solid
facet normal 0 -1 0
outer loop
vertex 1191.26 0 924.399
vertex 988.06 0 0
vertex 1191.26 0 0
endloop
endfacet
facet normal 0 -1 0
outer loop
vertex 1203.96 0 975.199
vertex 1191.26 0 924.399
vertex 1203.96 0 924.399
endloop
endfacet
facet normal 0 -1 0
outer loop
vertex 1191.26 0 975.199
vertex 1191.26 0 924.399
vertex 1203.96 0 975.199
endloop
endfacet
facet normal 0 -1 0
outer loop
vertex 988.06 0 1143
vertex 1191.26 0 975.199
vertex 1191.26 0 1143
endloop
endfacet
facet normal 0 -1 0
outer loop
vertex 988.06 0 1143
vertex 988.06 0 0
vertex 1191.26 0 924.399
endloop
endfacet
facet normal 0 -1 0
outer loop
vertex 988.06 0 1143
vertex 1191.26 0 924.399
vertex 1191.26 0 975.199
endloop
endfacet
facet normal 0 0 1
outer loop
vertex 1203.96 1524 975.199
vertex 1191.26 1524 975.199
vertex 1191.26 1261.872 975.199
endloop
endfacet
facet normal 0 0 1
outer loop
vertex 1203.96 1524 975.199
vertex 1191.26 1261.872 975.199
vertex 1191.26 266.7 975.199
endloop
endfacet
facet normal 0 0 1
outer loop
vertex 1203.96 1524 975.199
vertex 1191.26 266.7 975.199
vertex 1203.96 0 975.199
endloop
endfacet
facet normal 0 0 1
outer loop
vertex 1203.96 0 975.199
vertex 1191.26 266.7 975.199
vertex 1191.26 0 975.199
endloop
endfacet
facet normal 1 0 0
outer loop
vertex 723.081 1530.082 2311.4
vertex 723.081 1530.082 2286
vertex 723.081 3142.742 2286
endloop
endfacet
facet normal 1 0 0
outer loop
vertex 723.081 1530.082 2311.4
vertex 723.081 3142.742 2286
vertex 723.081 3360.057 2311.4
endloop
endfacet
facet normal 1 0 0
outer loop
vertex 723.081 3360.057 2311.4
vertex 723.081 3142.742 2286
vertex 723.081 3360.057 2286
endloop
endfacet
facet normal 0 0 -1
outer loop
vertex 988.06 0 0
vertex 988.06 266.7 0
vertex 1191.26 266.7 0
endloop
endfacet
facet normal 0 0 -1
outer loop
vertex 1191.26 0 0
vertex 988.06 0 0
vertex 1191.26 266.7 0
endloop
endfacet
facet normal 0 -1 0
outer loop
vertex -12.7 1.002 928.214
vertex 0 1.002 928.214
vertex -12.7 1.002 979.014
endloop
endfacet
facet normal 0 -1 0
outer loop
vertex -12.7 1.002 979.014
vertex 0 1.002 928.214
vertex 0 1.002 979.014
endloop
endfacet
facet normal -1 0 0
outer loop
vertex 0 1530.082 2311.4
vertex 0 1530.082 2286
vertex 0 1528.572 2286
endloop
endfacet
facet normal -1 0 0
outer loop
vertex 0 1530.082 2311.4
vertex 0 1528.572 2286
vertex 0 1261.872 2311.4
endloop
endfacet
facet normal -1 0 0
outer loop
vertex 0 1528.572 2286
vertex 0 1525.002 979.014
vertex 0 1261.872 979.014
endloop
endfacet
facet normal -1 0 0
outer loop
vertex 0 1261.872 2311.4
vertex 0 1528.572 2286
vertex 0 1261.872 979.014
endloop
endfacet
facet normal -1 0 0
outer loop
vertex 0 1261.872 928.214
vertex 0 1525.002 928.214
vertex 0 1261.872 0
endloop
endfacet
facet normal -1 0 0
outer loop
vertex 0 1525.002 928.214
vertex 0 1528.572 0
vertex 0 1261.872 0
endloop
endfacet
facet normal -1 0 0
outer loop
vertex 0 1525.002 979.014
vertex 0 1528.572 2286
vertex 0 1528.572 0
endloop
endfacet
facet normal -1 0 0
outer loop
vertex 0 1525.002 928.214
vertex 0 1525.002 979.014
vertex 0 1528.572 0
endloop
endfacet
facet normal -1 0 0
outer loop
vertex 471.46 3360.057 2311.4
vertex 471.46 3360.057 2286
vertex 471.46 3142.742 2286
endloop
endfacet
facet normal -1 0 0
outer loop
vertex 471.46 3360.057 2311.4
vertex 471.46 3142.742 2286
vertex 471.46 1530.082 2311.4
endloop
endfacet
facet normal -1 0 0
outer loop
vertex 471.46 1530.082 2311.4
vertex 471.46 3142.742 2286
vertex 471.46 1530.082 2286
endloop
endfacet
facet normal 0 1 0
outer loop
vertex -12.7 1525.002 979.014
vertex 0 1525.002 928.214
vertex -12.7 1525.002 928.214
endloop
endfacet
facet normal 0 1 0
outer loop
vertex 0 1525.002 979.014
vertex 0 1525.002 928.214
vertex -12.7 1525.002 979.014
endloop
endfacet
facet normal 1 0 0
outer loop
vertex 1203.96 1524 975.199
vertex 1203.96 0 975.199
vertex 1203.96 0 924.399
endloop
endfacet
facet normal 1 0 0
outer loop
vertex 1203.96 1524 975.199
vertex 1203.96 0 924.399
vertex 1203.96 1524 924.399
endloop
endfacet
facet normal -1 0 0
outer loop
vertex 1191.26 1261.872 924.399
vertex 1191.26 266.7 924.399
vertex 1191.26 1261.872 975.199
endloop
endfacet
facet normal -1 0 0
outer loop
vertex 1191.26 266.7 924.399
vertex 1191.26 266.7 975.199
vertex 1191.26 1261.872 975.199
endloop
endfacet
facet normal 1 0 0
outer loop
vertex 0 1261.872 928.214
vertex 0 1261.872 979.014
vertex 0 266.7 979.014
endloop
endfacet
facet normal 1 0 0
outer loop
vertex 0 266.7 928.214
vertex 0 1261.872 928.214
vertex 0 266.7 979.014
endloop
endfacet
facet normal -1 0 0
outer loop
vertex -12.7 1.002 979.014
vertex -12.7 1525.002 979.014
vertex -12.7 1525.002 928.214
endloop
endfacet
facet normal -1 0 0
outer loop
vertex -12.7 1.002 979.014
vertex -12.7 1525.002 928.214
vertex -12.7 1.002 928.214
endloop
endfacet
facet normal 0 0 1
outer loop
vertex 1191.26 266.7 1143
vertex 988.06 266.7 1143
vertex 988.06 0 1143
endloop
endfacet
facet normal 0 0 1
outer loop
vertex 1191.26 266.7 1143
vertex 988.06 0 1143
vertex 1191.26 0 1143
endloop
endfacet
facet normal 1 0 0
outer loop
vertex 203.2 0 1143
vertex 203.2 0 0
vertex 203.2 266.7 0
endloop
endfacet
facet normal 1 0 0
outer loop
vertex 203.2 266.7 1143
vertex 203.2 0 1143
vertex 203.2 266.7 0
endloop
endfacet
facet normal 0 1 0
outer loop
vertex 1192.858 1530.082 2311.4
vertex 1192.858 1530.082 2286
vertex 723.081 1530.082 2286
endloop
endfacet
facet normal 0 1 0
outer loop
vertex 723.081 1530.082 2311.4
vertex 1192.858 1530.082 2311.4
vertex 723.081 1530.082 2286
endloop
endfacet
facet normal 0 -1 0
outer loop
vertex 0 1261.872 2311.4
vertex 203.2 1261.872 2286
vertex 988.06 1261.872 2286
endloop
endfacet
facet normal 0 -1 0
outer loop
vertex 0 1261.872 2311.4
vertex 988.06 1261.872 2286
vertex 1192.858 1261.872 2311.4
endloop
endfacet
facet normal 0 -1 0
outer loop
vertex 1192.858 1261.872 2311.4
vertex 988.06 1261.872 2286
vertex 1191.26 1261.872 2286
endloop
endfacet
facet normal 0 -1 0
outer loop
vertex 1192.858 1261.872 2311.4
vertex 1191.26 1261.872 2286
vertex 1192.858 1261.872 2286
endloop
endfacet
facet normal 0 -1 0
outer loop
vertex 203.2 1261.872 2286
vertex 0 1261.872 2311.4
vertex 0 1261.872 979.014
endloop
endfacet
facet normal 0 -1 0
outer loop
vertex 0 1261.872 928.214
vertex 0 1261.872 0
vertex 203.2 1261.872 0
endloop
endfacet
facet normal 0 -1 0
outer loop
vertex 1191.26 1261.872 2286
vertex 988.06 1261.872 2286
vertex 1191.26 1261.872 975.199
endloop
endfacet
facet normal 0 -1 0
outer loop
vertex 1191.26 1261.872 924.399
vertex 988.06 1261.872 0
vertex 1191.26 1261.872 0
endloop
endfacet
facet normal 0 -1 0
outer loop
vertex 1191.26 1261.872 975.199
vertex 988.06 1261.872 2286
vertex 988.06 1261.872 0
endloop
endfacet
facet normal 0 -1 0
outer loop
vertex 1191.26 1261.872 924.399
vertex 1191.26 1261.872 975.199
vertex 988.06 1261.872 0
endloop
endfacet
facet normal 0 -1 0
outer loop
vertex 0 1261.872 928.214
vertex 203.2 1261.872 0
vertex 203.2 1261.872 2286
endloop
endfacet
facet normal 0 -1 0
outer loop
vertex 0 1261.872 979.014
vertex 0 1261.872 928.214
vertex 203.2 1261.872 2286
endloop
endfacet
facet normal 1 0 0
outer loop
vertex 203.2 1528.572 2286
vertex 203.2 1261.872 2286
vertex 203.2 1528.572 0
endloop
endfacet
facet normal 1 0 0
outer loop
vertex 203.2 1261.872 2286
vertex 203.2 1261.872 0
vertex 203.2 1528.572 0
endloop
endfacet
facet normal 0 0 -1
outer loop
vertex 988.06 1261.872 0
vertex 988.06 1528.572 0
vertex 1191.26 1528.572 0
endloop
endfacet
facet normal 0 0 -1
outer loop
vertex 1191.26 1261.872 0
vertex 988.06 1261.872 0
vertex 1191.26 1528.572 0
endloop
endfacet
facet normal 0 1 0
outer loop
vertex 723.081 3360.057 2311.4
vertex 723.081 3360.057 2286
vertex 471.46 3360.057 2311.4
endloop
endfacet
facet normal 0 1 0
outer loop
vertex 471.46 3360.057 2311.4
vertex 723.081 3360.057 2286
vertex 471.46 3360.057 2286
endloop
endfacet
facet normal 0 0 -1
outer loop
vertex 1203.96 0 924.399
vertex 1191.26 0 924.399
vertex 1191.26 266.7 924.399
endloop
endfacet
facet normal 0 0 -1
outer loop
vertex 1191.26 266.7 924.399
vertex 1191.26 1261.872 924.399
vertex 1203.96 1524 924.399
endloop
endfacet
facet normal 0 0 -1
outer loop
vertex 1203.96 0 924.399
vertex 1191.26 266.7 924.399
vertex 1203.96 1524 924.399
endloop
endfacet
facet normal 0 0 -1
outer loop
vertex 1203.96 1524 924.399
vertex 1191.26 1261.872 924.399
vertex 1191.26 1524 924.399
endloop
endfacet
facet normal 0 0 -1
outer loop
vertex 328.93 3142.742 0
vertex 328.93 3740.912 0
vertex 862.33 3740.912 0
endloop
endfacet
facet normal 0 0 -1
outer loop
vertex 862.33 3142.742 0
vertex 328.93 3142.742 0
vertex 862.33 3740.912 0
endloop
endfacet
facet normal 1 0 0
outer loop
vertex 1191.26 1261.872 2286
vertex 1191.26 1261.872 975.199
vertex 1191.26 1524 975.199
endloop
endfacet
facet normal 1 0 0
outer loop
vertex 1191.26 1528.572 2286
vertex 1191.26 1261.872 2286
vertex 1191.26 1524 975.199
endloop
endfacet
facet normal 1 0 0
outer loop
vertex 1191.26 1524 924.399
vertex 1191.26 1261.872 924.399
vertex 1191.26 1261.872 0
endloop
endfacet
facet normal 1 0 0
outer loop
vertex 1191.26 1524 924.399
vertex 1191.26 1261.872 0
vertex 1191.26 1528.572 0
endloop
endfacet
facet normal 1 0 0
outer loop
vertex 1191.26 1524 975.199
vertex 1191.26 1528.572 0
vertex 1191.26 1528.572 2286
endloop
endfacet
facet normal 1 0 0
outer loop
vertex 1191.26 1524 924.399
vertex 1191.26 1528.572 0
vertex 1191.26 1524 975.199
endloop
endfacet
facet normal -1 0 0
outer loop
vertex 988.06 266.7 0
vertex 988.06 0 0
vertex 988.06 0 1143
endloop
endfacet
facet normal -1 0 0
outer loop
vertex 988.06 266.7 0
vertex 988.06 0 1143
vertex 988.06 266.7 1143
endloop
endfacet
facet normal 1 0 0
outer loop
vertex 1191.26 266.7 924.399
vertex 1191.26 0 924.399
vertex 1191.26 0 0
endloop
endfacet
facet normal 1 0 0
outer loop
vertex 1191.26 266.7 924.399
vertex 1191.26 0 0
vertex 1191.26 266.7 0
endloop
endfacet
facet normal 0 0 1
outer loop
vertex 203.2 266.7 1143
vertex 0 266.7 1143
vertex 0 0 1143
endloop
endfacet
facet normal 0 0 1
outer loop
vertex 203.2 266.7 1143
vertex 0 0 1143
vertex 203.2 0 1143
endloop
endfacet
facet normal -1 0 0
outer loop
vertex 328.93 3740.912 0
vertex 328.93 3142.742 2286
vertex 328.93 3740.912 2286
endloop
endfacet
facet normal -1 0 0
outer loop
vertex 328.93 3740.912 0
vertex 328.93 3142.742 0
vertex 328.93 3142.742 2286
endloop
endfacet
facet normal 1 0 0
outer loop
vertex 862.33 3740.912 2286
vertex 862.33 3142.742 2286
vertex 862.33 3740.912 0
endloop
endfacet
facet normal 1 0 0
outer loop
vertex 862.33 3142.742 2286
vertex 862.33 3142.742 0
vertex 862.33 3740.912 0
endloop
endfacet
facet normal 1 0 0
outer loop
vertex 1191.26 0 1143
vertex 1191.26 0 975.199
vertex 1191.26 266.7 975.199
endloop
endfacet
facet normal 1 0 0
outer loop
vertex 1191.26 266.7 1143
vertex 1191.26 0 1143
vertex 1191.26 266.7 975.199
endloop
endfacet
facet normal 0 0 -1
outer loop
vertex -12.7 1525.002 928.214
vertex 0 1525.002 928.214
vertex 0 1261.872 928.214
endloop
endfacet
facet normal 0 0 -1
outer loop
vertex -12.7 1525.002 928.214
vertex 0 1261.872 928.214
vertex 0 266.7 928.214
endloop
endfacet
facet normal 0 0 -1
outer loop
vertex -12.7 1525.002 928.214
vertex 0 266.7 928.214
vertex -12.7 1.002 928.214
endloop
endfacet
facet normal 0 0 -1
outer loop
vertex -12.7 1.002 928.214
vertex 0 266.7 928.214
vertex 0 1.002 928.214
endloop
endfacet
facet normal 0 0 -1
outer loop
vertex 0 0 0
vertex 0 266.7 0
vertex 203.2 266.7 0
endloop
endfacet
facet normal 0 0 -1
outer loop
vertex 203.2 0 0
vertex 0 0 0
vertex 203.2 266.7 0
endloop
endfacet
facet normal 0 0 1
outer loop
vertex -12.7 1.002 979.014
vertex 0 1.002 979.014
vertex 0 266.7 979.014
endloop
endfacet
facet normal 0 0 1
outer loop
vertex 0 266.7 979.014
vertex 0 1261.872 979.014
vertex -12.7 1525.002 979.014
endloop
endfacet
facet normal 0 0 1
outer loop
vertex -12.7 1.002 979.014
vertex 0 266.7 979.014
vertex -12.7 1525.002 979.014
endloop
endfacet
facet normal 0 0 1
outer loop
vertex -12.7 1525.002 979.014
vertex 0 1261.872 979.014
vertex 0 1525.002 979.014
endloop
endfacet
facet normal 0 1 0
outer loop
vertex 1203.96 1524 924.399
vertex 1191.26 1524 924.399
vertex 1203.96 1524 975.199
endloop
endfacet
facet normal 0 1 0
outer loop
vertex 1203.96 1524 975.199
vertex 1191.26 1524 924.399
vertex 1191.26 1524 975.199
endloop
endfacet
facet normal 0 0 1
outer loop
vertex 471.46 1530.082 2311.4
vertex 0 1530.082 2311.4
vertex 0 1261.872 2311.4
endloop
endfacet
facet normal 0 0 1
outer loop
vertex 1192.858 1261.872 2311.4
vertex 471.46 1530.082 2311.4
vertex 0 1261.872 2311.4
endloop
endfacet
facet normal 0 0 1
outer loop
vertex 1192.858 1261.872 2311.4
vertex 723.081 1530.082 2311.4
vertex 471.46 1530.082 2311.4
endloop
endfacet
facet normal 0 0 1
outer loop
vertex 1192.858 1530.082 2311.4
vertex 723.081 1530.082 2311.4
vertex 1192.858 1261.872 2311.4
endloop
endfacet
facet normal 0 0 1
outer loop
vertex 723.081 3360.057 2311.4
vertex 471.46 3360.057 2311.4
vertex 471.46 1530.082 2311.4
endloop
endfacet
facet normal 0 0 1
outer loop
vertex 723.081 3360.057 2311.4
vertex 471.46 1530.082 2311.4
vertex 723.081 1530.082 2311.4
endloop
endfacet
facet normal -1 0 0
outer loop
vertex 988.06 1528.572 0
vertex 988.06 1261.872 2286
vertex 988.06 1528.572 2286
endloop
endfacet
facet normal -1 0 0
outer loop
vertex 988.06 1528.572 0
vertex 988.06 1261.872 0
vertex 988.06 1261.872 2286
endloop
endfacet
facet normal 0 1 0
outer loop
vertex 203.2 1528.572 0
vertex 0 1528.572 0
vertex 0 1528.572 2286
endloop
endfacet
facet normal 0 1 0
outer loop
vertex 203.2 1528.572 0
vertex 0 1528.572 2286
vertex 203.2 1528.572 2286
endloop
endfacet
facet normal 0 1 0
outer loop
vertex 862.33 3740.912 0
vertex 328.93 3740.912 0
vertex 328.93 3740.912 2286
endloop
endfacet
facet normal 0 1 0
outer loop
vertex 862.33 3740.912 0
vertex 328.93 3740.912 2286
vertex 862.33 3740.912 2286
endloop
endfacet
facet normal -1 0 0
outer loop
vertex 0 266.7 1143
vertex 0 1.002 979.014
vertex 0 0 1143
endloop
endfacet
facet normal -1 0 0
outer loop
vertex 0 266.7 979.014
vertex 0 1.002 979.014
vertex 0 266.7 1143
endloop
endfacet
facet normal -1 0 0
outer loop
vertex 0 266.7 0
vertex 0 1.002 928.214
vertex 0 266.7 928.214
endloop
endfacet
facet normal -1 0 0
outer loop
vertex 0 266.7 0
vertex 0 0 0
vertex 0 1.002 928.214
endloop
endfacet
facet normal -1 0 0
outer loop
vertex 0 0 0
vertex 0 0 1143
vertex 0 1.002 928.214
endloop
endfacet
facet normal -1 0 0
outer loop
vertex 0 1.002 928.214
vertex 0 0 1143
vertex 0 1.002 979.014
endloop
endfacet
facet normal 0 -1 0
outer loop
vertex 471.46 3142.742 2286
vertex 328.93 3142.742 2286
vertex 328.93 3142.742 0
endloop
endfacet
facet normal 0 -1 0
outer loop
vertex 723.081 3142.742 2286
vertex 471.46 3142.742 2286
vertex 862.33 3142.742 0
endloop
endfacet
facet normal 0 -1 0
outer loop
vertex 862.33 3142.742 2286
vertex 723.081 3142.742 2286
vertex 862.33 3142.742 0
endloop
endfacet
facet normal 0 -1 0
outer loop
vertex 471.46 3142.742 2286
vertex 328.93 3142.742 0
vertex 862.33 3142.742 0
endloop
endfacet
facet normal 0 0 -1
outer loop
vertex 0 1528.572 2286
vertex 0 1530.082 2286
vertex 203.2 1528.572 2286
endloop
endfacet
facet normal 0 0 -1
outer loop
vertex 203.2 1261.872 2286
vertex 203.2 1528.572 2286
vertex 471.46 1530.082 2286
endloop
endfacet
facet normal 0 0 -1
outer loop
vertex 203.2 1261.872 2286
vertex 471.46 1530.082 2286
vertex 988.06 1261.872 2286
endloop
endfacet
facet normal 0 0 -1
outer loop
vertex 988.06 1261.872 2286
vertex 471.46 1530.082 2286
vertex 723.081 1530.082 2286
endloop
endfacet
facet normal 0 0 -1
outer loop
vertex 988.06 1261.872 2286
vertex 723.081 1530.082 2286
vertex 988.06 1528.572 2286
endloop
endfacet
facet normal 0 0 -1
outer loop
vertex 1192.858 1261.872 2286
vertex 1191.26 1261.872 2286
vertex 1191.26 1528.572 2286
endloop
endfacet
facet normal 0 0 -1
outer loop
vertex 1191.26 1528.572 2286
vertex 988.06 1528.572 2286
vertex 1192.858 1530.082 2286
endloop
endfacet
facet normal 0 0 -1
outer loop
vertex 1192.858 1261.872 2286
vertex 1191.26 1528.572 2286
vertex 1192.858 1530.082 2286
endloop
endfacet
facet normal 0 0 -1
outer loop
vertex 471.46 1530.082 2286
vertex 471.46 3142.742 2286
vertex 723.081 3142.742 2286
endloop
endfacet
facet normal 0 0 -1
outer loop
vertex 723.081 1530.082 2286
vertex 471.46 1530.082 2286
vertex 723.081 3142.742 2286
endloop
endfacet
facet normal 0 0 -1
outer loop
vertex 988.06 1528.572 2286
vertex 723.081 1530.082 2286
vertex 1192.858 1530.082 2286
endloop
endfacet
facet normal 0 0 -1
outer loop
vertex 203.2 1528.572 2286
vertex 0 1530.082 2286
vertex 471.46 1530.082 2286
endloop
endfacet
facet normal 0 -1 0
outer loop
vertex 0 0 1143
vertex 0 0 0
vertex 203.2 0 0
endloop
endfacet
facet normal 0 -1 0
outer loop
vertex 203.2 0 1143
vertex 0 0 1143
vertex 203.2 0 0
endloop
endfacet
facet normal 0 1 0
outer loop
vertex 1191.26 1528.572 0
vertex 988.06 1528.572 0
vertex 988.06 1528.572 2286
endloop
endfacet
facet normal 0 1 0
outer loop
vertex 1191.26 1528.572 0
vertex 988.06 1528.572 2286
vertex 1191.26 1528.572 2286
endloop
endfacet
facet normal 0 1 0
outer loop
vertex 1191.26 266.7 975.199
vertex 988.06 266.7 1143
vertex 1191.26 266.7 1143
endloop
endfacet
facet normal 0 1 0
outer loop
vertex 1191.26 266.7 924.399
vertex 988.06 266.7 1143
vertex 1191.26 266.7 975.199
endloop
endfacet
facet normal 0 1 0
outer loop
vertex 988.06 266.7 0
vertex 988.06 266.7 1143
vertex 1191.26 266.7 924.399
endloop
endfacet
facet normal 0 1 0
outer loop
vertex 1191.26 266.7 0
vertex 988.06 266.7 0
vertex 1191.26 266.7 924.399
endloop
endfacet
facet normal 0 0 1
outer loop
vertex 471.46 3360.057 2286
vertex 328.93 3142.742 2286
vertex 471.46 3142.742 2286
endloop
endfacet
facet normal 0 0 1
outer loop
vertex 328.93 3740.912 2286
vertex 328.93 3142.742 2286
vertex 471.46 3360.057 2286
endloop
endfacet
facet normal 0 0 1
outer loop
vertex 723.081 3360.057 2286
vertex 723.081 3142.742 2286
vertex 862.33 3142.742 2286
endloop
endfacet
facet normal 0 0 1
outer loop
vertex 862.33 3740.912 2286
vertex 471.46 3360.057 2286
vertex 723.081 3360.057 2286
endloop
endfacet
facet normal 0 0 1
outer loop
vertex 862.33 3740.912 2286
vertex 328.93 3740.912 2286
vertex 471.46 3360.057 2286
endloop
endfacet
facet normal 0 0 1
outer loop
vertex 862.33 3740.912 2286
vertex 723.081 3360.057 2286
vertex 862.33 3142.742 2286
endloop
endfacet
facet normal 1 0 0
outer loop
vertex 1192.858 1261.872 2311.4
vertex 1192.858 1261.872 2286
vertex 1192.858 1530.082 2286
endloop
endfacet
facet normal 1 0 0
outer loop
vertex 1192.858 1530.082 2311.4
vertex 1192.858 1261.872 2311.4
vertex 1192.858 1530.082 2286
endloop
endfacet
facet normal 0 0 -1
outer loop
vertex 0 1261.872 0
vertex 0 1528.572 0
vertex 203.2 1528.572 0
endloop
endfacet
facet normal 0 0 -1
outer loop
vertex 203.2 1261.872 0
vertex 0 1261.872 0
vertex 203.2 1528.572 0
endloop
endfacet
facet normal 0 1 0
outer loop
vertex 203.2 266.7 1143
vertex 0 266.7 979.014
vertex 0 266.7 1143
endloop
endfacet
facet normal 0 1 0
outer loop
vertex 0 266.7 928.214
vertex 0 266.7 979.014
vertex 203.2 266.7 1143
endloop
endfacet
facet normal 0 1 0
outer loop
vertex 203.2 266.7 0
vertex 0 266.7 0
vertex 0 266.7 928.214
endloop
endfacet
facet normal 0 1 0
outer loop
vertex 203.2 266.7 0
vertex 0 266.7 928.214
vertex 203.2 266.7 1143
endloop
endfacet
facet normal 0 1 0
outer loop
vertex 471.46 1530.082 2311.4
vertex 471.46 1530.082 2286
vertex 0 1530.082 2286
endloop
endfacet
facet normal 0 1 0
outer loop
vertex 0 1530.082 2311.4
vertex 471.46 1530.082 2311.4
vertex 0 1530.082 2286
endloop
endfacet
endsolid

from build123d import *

# Parameters (mm, degrees)
F0_W     = 533.4
F0_H     = 598.17
F1_DEPTH = 1143
F0_W_2   = 203.2
F0_H_2   = 266.7
F2_DEPTH = 1143
F3_W     = 203.2
F3_H     = 266.7
F4_DEPTH = 25.4
F6_W     = 1258.3018835068
F6_H     = 50.8
F6_W_2   = 265.6981164932
F7_DEPTH = 12.7
F5_W     = 1257.3
F5_H     = 50.8
F5_W_2   = 266.7
F8_DEPTH = 12.7


with BuildPart() as f1:
    # F0 (on Top) → F1 (new body)
    with BuildSketch(Plane.XY):
        with Locations((595.63, 3441.827)):
            Rectangle(F0_W, F0_H)
    extrude(amount=F1_DEPTH)

    # F2#3 (add): a face of the model
    f2_3_faces = [f1.faces().sort_by_distance(p)[0] for p in [
        (595.63, 3441.827, 1143),
    ]]
    extrude(f2_3_faces, amount=F2_DEPTH)



with BuildPart() as f1b:
    # F0 (on Top) → F1, piece 2 (new body)
    with BuildSketch(Plane.XY):
        with Locations((1089.66, 1395.222)):
            Rectangle(F0_W_2, F0_H_2)
    extrude(amount=F1_DEPTH)

    # F2#2 (add): a face of the model
    f2_2_faces = [f1b.faces().sort_by_distance(p)[0] for p in [
        (1089.66, 1395.222, 1143),
    ]]
    extrude(f2_2_faces, amount=F2_DEPTH)


with BuildPart() as f1c:
    # F0 (on Top) → F1, piece 3 (new body)
    with BuildSketch(Plane.XY):
        with Locations((101.6, 1395.222)):
            Rectangle(F0_W_2, F0_H_2)
    extrude(amount=F1_DEPTH)

    # F2 (add): a face of the model
    f2_faces = [f1c.faces().sort_by_distance(p)[0] for p in [
        (101.6, 1395.222, 1143),
    ]]
    extrude(f2_faces, amount=F2_DEPTH)


with BuildPart() as f1d:
    # F0 (on Top) → F1, piece 4 (new body)
    with BuildSketch(Plane.XY):
        with Locations((101.6, 133.35)):
            Rectangle(F0_W_2, F0_H_2)
    extrude(amount=F1_DEPTH)


with BuildPart() as f1e:
    # F0 (on Top) → F1, piece 5 (new body)
    with BuildSketch(Plane.XY):
        with Locations((1089.66, 133.35)):
            Rectangle(F0_W_2, F0_H_2)
    extrude(amount=F1_DEPTH)


with BuildPart() as f1_1:
    add(f1.part)

    add(f1b.part)  # F4 merges F1b

    add(f1c.part)  # F4 merges F1c
    # F3 (on face) → F4 (join)
    with BuildSketch(Plane.XY.offset(2286)):
        Polygon((203.2, 1528.572), (203.2, 1261.872), (1192.8584575653, 1261.872), (1192.8584575653, 1530.0824642181), (723.0812907219, 1530.0824642181), (723.0812907219, 3360.0566387177), (471.4600145817, 3360.0566387177), (471.4600145817, 1530.0824642181), (0, 1530.0824642181), (0, 1528.572), align=None)
        with Locations((101.6, 1395.222)):
            Rectangle(F3_W, F3_H)
    extrude(amount=F4_DEPTH)


    add(f1d.part)  # F7 merges F1d
    # F6 (on face) → F7 (join)
    with BuildSketch(Plane(origin=(0, 0, 0), x_dir=(0, -1, 0), z_dir=(-1, 0, 0))):
        with Locations((-895.8509417534, 953.6137751579)):
            Rectangle(F6_W, F6_H)
        with Locations((-133.8509417534, 953.6137751579)):
            Rectangle(F6_W_2, F6_H)
    extrude(amount=F7_DEPTH)


    add(f1e.part)  # F8 merges F1e
    # F5 (on face) → F8 (join)
    with BuildSketch(Plane.YZ.offset(1191.26)):
        with Locations((895.35, 949.7992567062)):
            Rectangle(F5_W, F5_H)
        with Locations((133.35, 949.7992567062)):
            Rectangle(F5_W_2, F5_H)
    extrude(amount=F8_DEPTH)


solid = f1_1.part
